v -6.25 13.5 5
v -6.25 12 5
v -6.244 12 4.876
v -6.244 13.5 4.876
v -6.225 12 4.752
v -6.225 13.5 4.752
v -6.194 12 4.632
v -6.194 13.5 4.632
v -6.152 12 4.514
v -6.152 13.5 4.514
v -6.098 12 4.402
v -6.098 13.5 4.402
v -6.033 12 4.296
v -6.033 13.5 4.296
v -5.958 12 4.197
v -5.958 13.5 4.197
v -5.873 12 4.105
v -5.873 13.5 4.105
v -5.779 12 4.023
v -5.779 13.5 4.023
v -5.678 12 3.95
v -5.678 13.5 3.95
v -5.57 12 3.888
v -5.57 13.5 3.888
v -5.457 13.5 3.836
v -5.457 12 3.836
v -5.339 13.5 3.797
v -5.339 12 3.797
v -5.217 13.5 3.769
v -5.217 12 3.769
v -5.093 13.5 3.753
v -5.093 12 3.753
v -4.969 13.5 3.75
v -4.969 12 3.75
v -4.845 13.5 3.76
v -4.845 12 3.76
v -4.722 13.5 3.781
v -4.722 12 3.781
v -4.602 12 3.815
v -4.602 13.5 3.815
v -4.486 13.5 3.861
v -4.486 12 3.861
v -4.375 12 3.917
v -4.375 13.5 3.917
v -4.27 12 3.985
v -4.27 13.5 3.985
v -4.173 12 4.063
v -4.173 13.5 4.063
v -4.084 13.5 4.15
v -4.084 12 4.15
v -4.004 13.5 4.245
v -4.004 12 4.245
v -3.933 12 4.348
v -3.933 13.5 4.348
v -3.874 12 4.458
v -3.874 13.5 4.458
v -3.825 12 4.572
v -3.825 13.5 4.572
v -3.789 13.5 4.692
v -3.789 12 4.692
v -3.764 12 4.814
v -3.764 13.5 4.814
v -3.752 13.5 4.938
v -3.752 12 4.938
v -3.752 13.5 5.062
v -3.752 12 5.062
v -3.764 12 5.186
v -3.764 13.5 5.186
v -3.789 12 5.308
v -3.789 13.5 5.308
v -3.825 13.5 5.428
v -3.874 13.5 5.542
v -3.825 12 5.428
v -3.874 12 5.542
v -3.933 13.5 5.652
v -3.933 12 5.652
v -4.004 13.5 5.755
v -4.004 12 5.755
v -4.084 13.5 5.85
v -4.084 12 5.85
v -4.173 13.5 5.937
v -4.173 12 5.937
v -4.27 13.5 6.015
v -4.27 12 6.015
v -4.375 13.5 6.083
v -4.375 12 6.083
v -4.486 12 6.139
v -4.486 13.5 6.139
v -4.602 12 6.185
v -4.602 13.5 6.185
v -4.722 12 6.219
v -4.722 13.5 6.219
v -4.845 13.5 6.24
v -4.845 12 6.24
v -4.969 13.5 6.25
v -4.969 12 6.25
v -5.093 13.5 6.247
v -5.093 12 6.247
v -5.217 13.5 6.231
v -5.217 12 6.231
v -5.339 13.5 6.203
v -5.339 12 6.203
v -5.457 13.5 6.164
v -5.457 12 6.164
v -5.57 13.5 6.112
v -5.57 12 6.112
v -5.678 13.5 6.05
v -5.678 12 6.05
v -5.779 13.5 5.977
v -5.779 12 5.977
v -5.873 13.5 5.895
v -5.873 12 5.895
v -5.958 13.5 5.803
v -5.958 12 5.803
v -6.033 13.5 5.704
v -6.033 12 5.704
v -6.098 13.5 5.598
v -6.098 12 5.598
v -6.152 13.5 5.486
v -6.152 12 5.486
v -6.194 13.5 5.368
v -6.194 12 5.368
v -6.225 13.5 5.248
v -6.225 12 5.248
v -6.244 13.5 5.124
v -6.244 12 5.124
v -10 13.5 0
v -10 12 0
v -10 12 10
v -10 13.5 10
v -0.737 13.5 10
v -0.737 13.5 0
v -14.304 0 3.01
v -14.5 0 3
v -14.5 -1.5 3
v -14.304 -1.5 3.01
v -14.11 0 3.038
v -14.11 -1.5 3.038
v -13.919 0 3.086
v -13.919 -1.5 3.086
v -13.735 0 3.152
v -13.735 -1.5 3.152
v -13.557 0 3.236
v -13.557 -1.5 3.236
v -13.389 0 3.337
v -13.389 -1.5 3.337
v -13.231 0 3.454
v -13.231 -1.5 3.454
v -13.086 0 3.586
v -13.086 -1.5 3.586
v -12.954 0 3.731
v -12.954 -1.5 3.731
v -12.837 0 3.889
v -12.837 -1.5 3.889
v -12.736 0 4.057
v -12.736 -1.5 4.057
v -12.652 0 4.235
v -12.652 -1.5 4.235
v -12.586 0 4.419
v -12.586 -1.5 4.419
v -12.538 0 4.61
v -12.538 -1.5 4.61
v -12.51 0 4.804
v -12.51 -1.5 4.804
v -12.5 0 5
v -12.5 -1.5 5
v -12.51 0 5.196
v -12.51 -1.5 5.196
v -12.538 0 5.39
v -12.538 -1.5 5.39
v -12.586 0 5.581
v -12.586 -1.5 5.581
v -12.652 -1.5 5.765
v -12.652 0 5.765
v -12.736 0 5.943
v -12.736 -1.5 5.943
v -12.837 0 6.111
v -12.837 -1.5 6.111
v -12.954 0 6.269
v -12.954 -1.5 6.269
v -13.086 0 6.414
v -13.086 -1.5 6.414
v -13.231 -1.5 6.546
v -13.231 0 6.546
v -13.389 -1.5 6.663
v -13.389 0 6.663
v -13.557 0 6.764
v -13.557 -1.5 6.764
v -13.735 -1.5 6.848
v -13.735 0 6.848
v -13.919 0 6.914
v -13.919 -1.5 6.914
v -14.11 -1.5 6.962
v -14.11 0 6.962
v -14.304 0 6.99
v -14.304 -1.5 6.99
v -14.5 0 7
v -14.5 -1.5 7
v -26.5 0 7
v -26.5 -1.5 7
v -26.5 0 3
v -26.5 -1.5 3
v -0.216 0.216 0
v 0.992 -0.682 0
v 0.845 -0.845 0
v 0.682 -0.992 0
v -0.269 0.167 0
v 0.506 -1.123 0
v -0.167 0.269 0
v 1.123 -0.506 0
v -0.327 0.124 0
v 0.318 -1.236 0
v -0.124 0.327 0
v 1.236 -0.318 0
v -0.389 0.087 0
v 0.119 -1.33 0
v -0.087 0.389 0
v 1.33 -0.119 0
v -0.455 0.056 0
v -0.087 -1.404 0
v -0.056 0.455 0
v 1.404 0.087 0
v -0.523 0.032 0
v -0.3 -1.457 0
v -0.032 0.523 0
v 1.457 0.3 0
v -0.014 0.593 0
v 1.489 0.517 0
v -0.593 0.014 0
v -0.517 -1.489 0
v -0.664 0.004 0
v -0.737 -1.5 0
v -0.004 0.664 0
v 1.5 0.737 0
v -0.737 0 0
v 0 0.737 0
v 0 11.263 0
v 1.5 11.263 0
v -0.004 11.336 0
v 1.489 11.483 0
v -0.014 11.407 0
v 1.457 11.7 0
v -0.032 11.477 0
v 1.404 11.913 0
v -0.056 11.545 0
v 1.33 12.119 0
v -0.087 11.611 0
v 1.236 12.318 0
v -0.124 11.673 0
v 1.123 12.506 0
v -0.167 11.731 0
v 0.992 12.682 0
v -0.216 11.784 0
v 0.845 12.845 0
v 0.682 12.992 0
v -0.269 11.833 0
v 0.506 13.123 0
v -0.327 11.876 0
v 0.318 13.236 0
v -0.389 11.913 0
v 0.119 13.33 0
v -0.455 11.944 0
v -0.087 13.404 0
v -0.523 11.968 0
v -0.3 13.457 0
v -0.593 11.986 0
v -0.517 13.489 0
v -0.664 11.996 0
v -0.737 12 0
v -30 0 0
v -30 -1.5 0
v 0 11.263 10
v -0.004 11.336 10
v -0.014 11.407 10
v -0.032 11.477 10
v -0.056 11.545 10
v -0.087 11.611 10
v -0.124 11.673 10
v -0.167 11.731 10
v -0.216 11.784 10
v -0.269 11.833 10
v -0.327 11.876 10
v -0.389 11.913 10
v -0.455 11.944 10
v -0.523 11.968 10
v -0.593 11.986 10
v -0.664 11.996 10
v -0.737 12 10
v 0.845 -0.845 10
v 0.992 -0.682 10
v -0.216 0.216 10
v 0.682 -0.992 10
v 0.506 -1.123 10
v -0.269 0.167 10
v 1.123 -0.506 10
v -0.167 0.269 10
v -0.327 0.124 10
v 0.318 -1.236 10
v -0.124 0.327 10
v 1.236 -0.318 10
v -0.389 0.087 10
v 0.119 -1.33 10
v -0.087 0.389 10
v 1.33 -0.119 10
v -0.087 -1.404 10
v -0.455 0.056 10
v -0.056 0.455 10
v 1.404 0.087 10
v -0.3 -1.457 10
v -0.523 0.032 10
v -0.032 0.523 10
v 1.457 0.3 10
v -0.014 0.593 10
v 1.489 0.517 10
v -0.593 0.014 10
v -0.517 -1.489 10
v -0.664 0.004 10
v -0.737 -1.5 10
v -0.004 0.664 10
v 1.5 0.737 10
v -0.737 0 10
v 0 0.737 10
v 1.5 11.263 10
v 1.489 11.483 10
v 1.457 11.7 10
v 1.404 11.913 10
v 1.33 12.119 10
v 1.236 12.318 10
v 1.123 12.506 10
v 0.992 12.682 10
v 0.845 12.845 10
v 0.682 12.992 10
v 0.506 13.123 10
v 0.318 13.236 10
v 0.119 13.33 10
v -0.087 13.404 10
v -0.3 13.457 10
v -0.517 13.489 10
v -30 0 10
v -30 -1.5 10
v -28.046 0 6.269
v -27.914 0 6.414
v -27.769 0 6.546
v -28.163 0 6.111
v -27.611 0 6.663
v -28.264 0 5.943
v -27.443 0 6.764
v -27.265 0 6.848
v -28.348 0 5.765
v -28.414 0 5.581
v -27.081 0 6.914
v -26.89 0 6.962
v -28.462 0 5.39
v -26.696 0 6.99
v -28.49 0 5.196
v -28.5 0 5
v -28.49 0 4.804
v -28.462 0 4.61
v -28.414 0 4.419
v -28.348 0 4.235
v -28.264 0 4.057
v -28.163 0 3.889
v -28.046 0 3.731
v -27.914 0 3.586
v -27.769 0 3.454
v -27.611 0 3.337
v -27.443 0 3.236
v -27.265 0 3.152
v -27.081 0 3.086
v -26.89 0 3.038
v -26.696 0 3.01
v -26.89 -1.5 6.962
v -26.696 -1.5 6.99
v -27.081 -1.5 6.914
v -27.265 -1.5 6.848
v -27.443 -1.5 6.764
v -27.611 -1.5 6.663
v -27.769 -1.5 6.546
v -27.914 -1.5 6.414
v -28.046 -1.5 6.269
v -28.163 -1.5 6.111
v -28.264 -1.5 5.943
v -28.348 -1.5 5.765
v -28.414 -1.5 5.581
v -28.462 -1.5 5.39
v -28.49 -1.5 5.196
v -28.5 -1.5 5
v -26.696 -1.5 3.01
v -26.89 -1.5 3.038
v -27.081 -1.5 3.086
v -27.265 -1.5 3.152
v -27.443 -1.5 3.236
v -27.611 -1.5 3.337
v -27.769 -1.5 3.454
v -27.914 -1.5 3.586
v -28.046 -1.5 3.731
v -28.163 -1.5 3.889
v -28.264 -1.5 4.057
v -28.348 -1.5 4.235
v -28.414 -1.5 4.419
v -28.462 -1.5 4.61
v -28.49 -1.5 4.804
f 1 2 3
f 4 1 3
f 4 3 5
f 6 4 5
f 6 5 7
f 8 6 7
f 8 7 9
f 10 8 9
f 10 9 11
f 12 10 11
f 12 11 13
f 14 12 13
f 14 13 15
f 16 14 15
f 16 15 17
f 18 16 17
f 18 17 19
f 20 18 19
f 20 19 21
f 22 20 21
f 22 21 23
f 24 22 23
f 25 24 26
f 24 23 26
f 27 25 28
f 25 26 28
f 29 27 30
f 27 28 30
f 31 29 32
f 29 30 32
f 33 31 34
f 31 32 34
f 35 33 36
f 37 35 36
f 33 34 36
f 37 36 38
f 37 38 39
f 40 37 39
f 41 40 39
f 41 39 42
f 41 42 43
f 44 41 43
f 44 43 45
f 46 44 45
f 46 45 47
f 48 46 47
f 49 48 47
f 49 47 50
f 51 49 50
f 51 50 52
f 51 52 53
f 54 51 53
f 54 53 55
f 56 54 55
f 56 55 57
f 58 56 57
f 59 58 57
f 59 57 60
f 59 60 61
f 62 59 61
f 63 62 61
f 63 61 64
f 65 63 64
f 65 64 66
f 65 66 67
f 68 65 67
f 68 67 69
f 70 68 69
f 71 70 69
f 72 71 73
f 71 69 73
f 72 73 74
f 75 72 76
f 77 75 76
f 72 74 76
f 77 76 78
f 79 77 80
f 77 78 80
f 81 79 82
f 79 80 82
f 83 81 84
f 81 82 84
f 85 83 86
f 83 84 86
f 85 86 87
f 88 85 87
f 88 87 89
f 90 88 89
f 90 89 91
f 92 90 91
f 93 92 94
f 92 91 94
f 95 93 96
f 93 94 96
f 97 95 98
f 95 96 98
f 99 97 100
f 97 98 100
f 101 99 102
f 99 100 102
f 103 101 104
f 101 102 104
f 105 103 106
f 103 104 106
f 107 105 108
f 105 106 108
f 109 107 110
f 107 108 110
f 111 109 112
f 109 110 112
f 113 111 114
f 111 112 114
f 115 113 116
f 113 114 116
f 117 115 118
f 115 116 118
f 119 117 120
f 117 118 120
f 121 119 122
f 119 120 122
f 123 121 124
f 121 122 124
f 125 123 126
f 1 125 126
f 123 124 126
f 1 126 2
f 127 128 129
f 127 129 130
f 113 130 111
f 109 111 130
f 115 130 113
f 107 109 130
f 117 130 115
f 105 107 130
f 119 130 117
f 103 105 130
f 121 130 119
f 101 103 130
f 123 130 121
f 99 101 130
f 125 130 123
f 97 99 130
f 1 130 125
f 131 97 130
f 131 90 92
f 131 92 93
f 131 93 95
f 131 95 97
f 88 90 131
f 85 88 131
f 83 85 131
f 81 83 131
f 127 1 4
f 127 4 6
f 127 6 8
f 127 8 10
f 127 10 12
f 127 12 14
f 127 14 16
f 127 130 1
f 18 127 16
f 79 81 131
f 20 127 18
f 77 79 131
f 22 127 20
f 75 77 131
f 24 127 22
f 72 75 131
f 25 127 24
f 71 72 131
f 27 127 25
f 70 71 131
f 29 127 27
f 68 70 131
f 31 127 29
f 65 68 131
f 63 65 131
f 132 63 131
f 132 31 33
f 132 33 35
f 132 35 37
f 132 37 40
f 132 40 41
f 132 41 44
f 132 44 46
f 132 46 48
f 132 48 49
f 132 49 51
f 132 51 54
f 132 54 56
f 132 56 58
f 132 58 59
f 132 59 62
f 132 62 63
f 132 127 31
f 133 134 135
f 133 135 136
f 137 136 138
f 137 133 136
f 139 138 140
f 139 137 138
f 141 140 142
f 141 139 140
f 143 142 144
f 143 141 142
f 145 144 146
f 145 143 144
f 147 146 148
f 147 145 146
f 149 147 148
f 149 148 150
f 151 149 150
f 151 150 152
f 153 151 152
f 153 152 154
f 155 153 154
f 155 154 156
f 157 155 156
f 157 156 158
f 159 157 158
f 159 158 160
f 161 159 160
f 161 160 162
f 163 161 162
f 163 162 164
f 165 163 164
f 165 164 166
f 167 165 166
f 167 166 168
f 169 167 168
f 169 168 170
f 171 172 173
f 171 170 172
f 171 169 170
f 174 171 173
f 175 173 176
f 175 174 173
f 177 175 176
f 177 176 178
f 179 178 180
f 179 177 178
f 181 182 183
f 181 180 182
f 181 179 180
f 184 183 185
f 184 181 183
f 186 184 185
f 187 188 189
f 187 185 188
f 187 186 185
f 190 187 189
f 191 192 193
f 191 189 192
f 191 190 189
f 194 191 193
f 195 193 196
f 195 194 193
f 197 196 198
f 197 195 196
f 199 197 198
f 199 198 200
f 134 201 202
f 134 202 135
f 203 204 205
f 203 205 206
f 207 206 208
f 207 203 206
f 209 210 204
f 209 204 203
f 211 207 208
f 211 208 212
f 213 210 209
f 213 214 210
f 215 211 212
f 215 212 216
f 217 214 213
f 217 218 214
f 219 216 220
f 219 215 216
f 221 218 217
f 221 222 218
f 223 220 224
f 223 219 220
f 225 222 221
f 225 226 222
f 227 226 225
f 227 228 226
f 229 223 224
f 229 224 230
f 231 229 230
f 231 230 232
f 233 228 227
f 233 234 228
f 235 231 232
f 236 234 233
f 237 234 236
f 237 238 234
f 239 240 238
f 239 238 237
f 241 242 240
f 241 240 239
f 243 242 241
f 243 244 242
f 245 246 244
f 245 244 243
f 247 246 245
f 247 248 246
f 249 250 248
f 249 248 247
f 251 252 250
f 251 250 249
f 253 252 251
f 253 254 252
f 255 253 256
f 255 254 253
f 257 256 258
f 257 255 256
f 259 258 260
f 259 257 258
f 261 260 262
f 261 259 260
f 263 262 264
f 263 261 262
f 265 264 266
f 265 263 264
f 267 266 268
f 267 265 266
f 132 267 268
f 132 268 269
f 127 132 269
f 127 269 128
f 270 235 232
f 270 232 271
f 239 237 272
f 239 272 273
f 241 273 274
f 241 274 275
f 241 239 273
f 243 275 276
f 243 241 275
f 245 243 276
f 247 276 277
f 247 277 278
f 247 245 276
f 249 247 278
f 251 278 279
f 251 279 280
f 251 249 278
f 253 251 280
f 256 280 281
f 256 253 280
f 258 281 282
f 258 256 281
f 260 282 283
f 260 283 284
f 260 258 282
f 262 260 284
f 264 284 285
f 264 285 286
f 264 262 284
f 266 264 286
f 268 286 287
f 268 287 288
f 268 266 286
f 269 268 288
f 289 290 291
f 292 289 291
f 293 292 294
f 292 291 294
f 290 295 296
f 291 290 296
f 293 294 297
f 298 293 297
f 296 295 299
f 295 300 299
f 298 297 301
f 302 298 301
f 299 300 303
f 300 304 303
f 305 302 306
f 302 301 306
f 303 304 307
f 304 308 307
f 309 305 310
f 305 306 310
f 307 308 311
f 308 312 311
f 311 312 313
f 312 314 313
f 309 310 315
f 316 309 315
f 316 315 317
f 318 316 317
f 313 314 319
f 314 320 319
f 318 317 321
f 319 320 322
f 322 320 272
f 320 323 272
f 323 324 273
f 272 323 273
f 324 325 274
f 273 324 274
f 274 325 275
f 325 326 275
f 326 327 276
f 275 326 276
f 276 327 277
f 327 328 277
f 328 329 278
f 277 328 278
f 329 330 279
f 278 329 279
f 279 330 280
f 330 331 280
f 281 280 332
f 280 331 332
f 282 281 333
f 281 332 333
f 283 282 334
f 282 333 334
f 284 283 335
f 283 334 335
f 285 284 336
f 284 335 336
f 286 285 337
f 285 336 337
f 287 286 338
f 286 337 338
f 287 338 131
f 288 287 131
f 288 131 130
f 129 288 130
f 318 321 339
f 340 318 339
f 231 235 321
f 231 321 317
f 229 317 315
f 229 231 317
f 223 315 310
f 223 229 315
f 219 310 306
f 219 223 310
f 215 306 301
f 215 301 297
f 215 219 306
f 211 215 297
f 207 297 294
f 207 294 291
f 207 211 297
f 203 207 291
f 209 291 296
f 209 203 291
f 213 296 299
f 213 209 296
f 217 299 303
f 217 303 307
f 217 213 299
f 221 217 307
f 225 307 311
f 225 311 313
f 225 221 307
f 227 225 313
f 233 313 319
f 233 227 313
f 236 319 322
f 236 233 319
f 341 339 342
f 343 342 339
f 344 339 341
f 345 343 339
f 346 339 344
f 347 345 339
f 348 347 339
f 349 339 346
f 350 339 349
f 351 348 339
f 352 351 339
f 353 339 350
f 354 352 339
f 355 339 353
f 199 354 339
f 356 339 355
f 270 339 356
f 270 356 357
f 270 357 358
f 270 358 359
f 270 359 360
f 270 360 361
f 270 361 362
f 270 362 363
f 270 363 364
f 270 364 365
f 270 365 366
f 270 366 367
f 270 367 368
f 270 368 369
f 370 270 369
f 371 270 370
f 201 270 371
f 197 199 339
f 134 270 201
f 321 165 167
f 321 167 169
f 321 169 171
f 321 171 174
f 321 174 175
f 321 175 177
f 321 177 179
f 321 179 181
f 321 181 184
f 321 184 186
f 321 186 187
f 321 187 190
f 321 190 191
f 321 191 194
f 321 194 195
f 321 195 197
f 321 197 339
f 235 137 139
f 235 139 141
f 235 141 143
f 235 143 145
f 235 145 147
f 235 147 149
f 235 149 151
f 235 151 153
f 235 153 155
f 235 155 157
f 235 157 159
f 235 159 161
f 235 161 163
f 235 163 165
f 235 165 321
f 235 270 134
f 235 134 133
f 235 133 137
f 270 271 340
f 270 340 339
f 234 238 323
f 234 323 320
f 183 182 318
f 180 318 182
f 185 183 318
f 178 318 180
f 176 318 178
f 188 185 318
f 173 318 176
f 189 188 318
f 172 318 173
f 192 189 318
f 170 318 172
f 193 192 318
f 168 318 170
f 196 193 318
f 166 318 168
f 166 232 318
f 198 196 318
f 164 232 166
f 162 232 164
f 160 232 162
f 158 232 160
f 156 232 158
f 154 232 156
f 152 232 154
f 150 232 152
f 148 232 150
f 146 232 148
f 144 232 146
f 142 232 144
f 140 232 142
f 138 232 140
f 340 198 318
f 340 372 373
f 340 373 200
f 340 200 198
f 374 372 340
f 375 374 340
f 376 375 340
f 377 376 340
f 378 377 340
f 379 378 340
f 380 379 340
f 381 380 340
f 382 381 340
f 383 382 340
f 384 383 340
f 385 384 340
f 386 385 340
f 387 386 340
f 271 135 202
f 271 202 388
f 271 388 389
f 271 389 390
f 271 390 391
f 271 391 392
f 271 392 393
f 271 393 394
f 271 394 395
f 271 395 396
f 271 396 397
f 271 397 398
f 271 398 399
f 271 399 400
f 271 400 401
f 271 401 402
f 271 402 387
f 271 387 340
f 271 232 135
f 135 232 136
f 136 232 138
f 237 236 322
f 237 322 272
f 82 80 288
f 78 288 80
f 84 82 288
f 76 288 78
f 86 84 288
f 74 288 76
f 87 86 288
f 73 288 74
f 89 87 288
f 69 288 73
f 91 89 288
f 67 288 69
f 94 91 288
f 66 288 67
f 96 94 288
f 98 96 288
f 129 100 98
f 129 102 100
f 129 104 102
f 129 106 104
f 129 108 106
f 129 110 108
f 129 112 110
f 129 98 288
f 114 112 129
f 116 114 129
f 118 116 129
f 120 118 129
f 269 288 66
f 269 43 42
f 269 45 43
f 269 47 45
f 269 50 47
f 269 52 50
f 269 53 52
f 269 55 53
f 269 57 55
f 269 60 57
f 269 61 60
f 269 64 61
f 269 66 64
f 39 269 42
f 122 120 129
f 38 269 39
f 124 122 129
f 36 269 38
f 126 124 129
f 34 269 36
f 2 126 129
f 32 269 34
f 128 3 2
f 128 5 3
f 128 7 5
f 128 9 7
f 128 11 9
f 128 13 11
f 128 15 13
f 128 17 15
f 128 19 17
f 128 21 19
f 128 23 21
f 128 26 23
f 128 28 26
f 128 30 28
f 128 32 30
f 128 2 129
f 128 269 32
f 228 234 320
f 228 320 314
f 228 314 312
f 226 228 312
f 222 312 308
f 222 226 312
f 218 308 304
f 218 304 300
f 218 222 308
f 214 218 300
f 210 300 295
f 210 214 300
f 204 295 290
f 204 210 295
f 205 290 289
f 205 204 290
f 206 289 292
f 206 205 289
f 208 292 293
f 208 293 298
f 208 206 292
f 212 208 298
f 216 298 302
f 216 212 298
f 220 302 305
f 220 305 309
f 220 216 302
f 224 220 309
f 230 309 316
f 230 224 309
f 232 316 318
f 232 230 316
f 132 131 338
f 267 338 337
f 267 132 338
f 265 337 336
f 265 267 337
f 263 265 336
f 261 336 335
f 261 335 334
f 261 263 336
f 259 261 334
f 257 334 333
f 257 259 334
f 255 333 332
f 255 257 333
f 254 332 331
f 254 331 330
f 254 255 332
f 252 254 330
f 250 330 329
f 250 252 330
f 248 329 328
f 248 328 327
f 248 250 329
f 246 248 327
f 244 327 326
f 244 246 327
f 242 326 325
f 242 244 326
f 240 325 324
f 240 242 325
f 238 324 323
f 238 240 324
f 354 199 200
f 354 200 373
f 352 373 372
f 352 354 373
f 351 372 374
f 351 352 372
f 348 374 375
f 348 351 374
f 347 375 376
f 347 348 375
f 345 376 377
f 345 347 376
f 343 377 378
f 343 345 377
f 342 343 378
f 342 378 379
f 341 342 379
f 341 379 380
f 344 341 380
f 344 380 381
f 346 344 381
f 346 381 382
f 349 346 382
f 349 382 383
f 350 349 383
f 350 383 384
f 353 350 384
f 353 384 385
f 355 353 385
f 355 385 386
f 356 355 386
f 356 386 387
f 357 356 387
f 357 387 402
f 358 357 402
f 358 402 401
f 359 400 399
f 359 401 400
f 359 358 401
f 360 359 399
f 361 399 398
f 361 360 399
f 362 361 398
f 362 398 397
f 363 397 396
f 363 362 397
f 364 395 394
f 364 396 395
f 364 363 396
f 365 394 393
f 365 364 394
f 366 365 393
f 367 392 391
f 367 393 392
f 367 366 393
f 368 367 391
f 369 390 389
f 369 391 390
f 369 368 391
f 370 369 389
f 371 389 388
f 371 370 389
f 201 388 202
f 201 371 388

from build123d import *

# Parameters (mm, degrees)
SM_BASE_FLANGE_1_DEPTH = 10
HOLE_WIZARD_M3_1_D     = 2.5
HOLE_WIZARD_M3_1_DEPTH = 1.5
F_4_0MM_1_D            = 4
CUT_EXTRUDE_1_DEPTH    = 10


# Sheet-metal steps are written as plain solids
with BuildPart() as part:
    # Sketch 1 → 基材-凸緣1 (new body)
    with BuildSketch(Plane.XY):
        with BuildLine():
            Line((-30, 0), (-0.7366, 0))
            ThreePointArc((-0.7366, 0), (-0.215745145, 0.215745145), (0, 0.7366))
            Line((0, 0.7366), (0, 11.2634))
            ThreePointArc((0, 11.2634), (-0.215745145, 11.784254855), (-0.7366, 12))
            Line((-0.7366, 12), (-10, 12))
            Line((-10, 12), (-10, 13.5))
            Line((-10, 13.5), (-0.7366, 13.5))
            ThreePointArc((-0.7366, 13.5), (0.844915027, 12.844915027), (1.5, 11.2634))
            Line((1.5, 11.2634), (1.5, 0.7366))
            ThreePointArc((1.5, 0.7366), (0.844915027, -0.844915027), (-0.7366, -1.5))
            Line((-0.7366, -1.5), (-30, -1.5))
            Line((-30, -1.5), (-30, 0))
        make_face()
    extrude(amount=SM_BASE_FLANGE_1_DEPTH)

    # M3 螺紋孔1
    with Locations(Plane(origin=(0, 13.5, 0), x_dir=(1, 0, 0), z_dir=(0, 1, 0))):
        with Locations((-5, -5)):
            Hole(HOLE_WIZARD_M3_1_D / 2, depth=HOLE_WIZARD_M3_1_DEPTH)

    # Ø4.0mm 定位孔1 (through all)
    with Locations(Plane(origin=(0, -1.5, 0), x_dir=(-1, 0, 0), z_dir=(0, -1, 0))):
        with Locations((26, -5), (18, -5)):
            Hole(F_4_0MM_1_D / 2)

    # 草圖11 → 除料-伸長1 (cut)
    with BuildSketch(Plane(origin=(0, 0, 0), x_dir=(1, 0, 0), z_dir=(0, 1, 0))):
        with BuildLine():
            Line((-14.5, -7), (-26.5, -7))
            ThreePointArc((-26.5, -7), (-28.5, -5), (-26.5, -3))
            Line((-26.5, -3), (-14.5, -3))
            ThreePointArc((-14.5, -3), (-12.5, -5), (-14.5, -7))
        make_face()
    extrude(amount=-CUT_EXTRUDE_1_DEPTH, mode=Mode.SUBTRACT)


solid = part.part
